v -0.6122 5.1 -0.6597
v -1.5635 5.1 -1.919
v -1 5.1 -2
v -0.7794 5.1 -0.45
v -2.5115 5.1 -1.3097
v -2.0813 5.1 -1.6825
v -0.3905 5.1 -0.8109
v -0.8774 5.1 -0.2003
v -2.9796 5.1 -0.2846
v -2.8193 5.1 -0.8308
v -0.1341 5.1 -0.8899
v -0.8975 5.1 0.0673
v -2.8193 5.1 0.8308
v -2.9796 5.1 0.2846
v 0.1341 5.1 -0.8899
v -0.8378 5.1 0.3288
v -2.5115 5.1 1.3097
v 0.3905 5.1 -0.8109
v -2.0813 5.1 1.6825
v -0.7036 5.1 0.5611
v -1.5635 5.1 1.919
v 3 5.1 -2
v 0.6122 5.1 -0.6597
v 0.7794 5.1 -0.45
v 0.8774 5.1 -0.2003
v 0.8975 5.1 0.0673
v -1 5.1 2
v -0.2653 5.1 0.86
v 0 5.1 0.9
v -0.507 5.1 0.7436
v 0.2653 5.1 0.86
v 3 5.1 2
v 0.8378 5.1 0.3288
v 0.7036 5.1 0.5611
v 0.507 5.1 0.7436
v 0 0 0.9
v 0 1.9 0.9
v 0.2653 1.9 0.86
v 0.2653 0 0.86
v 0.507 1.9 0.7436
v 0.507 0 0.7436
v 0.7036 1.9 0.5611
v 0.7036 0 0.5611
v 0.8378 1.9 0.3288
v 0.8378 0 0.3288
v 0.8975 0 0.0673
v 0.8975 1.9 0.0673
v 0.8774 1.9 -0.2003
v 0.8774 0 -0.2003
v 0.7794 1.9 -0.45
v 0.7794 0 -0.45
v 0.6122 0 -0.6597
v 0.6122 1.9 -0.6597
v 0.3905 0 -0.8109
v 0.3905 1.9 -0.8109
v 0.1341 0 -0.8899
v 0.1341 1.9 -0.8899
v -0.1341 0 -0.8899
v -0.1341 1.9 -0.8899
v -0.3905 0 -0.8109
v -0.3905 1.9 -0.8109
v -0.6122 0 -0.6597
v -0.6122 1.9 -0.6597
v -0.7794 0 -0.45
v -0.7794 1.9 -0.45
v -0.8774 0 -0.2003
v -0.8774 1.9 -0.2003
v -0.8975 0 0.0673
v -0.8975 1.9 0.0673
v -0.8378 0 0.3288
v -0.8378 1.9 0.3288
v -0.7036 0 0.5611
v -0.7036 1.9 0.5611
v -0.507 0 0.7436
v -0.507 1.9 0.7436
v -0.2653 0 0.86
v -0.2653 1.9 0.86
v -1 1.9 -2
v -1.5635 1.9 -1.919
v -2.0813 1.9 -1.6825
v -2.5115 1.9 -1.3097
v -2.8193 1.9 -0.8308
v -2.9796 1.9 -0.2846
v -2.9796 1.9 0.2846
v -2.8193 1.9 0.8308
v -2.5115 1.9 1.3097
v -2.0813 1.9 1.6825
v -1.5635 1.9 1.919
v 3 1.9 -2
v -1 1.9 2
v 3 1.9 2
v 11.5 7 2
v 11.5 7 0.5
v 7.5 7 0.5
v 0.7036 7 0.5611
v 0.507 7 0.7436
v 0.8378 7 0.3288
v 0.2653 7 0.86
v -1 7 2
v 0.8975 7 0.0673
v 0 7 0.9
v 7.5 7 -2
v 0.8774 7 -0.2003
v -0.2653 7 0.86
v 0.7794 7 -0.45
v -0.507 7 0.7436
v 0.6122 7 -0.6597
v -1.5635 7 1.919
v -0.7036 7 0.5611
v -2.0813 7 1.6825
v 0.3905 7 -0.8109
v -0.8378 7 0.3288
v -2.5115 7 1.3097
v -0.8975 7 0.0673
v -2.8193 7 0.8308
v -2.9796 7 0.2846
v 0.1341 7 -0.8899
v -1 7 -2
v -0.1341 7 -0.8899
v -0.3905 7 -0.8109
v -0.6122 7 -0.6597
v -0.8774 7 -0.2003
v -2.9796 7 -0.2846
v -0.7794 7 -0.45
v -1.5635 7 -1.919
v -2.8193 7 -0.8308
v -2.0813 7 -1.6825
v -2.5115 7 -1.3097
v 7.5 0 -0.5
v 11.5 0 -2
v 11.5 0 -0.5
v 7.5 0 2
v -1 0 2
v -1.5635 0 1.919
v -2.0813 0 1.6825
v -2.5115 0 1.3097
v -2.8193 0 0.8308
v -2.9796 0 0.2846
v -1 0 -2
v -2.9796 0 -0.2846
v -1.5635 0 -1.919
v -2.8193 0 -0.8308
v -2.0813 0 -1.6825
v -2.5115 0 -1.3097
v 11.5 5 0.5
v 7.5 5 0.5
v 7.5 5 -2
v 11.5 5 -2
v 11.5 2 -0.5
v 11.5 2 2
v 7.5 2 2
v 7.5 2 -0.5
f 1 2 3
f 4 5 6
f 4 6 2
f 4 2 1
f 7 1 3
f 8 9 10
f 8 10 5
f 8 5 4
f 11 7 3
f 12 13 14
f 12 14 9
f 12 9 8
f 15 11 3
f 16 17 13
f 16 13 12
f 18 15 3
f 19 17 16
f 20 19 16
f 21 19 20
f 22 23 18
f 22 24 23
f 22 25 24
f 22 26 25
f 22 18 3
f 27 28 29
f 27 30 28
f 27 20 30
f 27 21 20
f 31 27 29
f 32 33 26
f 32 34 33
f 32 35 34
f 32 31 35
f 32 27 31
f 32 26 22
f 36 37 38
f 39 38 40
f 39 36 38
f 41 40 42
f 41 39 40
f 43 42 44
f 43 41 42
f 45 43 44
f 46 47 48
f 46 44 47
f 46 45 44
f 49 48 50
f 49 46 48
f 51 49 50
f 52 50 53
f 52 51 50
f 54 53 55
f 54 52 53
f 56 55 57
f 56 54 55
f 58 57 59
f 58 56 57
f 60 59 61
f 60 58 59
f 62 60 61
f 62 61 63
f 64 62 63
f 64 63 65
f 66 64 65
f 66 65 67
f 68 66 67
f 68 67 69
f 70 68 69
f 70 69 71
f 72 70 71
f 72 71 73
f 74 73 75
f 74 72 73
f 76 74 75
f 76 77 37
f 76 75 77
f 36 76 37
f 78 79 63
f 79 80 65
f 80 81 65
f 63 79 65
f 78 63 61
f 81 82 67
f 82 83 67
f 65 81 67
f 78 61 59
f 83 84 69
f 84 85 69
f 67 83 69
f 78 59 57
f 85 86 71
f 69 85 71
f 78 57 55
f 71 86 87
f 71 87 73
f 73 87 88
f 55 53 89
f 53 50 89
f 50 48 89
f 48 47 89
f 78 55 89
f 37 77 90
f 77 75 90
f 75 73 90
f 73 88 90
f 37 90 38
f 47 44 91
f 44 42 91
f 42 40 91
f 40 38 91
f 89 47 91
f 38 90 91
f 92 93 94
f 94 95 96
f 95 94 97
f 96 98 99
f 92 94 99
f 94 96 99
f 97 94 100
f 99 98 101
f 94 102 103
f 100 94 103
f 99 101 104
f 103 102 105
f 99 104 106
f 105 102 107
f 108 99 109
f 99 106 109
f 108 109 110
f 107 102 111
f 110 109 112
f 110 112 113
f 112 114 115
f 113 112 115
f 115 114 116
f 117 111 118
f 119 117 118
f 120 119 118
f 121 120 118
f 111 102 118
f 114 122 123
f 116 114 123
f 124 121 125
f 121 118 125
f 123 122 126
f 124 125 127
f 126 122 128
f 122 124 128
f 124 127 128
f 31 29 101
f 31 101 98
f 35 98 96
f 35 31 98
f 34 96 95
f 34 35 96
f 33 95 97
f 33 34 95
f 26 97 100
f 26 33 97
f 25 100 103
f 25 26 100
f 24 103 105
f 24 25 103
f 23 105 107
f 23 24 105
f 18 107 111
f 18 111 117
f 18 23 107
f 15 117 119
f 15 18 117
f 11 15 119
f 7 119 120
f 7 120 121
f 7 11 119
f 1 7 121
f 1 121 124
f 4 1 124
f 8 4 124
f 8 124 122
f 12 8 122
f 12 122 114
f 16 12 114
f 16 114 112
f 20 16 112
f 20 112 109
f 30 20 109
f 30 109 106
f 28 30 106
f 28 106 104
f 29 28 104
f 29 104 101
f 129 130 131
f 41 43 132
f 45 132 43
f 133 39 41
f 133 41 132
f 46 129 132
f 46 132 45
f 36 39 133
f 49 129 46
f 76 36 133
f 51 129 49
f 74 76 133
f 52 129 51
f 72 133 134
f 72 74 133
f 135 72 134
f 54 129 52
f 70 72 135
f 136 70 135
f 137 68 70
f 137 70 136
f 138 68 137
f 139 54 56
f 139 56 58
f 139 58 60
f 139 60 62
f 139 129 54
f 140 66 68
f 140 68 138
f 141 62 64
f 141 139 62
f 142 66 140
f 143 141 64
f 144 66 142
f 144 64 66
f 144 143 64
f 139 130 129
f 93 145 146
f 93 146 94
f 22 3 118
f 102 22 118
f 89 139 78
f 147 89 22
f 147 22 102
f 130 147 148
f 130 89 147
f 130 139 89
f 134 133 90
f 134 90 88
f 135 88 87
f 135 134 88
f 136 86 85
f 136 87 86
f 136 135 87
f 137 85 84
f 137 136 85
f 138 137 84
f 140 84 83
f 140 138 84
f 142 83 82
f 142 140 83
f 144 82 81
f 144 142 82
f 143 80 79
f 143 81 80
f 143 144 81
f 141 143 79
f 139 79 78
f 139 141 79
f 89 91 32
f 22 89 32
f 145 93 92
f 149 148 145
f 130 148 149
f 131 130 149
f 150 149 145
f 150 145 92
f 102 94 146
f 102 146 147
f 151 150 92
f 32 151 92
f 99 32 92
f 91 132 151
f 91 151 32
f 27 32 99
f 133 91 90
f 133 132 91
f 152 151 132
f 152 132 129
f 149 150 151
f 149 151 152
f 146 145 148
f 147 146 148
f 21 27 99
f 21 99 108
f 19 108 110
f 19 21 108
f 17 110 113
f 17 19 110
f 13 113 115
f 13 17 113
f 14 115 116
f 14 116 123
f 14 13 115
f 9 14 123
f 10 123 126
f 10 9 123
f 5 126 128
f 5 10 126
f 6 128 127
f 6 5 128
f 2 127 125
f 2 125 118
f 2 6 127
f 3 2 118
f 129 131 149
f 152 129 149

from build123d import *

# Parameters (mm, degrees)
SKETCH1_R           = 0.9
BOSS_EXTRUDE1_DEPTH = 7
CUT_EXTRUDE1_REACH  = 16.045
SKETCH2_W           = 6
SKETCH2_H           = 3.2
SKETCH3_W           = 2.5
SKETCH3_H           = 2
CUT_EXTRUDE2_DEPTH  = 4


with BuildPart() as part:
    # Sketch1 → Boss-Extrude1 (new body)
    with BuildSketch(Plane(origin=(0, 0, 0), x_dir=(1, 0, 0), z_dir=(0, 1, 0))):
        with BuildLine():
            Line((-1, 2), (11.5, 2))
            Line((11.5, 2), (11.5, -2))
            Line((11.5, -2), (-1, -2))
            ThreePointArc((-1, -2), (-3, 0), (-1, 2))
        make_face()
        with Locations(Location((0, 0, 0), (0, 0, 270))):
            Circle(SKETCH1_R, mode=Mode.SUBTRACT)
    extrude(amount=BOSS_EXTRUDE1_DEPTH)

    # Sketch2 → Cut-Extrude1 (cut, up to next)
    with BuildSketch(Plane.XY.offset(2), mode=Mode.PRIVATE) as cut_extrude1_sk1:
        with Locations((0, 3.5)):
            Rectangle(SKETCH2_W, SKETCH2_H)
    cut_extrude1_tool1 = extrude(cut_extrude1_sk1.sketch, amount=-CUT_EXTRUDE1_REACH, mode=Mode.PRIVATE) & part.part
    add(cut_extrude1_tool1.solids().sort_by_distance((0, 3.5, 2))[0], mode=Mode.SUBTRACT)

    # Sketch3 → Cut-Extrude2 (cut)
    with BuildSketch(Plane(origin=(11.5, 0, 0), x_dir=(0, 0, -1), z_dir=(1, 0, 0))):
        with Locations((0.75, 6)):
            Rectangle(SKETCH3_W, SKETCH3_H)
        with Locations((-0.75, 1)):
            Rectangle(SKETCH3_W, SKETCH3_H)
    extrude(amount=-CUT_EXTRUDE2_DEPTH, mode=Mode.SUBTRACT)


solid = part.part
